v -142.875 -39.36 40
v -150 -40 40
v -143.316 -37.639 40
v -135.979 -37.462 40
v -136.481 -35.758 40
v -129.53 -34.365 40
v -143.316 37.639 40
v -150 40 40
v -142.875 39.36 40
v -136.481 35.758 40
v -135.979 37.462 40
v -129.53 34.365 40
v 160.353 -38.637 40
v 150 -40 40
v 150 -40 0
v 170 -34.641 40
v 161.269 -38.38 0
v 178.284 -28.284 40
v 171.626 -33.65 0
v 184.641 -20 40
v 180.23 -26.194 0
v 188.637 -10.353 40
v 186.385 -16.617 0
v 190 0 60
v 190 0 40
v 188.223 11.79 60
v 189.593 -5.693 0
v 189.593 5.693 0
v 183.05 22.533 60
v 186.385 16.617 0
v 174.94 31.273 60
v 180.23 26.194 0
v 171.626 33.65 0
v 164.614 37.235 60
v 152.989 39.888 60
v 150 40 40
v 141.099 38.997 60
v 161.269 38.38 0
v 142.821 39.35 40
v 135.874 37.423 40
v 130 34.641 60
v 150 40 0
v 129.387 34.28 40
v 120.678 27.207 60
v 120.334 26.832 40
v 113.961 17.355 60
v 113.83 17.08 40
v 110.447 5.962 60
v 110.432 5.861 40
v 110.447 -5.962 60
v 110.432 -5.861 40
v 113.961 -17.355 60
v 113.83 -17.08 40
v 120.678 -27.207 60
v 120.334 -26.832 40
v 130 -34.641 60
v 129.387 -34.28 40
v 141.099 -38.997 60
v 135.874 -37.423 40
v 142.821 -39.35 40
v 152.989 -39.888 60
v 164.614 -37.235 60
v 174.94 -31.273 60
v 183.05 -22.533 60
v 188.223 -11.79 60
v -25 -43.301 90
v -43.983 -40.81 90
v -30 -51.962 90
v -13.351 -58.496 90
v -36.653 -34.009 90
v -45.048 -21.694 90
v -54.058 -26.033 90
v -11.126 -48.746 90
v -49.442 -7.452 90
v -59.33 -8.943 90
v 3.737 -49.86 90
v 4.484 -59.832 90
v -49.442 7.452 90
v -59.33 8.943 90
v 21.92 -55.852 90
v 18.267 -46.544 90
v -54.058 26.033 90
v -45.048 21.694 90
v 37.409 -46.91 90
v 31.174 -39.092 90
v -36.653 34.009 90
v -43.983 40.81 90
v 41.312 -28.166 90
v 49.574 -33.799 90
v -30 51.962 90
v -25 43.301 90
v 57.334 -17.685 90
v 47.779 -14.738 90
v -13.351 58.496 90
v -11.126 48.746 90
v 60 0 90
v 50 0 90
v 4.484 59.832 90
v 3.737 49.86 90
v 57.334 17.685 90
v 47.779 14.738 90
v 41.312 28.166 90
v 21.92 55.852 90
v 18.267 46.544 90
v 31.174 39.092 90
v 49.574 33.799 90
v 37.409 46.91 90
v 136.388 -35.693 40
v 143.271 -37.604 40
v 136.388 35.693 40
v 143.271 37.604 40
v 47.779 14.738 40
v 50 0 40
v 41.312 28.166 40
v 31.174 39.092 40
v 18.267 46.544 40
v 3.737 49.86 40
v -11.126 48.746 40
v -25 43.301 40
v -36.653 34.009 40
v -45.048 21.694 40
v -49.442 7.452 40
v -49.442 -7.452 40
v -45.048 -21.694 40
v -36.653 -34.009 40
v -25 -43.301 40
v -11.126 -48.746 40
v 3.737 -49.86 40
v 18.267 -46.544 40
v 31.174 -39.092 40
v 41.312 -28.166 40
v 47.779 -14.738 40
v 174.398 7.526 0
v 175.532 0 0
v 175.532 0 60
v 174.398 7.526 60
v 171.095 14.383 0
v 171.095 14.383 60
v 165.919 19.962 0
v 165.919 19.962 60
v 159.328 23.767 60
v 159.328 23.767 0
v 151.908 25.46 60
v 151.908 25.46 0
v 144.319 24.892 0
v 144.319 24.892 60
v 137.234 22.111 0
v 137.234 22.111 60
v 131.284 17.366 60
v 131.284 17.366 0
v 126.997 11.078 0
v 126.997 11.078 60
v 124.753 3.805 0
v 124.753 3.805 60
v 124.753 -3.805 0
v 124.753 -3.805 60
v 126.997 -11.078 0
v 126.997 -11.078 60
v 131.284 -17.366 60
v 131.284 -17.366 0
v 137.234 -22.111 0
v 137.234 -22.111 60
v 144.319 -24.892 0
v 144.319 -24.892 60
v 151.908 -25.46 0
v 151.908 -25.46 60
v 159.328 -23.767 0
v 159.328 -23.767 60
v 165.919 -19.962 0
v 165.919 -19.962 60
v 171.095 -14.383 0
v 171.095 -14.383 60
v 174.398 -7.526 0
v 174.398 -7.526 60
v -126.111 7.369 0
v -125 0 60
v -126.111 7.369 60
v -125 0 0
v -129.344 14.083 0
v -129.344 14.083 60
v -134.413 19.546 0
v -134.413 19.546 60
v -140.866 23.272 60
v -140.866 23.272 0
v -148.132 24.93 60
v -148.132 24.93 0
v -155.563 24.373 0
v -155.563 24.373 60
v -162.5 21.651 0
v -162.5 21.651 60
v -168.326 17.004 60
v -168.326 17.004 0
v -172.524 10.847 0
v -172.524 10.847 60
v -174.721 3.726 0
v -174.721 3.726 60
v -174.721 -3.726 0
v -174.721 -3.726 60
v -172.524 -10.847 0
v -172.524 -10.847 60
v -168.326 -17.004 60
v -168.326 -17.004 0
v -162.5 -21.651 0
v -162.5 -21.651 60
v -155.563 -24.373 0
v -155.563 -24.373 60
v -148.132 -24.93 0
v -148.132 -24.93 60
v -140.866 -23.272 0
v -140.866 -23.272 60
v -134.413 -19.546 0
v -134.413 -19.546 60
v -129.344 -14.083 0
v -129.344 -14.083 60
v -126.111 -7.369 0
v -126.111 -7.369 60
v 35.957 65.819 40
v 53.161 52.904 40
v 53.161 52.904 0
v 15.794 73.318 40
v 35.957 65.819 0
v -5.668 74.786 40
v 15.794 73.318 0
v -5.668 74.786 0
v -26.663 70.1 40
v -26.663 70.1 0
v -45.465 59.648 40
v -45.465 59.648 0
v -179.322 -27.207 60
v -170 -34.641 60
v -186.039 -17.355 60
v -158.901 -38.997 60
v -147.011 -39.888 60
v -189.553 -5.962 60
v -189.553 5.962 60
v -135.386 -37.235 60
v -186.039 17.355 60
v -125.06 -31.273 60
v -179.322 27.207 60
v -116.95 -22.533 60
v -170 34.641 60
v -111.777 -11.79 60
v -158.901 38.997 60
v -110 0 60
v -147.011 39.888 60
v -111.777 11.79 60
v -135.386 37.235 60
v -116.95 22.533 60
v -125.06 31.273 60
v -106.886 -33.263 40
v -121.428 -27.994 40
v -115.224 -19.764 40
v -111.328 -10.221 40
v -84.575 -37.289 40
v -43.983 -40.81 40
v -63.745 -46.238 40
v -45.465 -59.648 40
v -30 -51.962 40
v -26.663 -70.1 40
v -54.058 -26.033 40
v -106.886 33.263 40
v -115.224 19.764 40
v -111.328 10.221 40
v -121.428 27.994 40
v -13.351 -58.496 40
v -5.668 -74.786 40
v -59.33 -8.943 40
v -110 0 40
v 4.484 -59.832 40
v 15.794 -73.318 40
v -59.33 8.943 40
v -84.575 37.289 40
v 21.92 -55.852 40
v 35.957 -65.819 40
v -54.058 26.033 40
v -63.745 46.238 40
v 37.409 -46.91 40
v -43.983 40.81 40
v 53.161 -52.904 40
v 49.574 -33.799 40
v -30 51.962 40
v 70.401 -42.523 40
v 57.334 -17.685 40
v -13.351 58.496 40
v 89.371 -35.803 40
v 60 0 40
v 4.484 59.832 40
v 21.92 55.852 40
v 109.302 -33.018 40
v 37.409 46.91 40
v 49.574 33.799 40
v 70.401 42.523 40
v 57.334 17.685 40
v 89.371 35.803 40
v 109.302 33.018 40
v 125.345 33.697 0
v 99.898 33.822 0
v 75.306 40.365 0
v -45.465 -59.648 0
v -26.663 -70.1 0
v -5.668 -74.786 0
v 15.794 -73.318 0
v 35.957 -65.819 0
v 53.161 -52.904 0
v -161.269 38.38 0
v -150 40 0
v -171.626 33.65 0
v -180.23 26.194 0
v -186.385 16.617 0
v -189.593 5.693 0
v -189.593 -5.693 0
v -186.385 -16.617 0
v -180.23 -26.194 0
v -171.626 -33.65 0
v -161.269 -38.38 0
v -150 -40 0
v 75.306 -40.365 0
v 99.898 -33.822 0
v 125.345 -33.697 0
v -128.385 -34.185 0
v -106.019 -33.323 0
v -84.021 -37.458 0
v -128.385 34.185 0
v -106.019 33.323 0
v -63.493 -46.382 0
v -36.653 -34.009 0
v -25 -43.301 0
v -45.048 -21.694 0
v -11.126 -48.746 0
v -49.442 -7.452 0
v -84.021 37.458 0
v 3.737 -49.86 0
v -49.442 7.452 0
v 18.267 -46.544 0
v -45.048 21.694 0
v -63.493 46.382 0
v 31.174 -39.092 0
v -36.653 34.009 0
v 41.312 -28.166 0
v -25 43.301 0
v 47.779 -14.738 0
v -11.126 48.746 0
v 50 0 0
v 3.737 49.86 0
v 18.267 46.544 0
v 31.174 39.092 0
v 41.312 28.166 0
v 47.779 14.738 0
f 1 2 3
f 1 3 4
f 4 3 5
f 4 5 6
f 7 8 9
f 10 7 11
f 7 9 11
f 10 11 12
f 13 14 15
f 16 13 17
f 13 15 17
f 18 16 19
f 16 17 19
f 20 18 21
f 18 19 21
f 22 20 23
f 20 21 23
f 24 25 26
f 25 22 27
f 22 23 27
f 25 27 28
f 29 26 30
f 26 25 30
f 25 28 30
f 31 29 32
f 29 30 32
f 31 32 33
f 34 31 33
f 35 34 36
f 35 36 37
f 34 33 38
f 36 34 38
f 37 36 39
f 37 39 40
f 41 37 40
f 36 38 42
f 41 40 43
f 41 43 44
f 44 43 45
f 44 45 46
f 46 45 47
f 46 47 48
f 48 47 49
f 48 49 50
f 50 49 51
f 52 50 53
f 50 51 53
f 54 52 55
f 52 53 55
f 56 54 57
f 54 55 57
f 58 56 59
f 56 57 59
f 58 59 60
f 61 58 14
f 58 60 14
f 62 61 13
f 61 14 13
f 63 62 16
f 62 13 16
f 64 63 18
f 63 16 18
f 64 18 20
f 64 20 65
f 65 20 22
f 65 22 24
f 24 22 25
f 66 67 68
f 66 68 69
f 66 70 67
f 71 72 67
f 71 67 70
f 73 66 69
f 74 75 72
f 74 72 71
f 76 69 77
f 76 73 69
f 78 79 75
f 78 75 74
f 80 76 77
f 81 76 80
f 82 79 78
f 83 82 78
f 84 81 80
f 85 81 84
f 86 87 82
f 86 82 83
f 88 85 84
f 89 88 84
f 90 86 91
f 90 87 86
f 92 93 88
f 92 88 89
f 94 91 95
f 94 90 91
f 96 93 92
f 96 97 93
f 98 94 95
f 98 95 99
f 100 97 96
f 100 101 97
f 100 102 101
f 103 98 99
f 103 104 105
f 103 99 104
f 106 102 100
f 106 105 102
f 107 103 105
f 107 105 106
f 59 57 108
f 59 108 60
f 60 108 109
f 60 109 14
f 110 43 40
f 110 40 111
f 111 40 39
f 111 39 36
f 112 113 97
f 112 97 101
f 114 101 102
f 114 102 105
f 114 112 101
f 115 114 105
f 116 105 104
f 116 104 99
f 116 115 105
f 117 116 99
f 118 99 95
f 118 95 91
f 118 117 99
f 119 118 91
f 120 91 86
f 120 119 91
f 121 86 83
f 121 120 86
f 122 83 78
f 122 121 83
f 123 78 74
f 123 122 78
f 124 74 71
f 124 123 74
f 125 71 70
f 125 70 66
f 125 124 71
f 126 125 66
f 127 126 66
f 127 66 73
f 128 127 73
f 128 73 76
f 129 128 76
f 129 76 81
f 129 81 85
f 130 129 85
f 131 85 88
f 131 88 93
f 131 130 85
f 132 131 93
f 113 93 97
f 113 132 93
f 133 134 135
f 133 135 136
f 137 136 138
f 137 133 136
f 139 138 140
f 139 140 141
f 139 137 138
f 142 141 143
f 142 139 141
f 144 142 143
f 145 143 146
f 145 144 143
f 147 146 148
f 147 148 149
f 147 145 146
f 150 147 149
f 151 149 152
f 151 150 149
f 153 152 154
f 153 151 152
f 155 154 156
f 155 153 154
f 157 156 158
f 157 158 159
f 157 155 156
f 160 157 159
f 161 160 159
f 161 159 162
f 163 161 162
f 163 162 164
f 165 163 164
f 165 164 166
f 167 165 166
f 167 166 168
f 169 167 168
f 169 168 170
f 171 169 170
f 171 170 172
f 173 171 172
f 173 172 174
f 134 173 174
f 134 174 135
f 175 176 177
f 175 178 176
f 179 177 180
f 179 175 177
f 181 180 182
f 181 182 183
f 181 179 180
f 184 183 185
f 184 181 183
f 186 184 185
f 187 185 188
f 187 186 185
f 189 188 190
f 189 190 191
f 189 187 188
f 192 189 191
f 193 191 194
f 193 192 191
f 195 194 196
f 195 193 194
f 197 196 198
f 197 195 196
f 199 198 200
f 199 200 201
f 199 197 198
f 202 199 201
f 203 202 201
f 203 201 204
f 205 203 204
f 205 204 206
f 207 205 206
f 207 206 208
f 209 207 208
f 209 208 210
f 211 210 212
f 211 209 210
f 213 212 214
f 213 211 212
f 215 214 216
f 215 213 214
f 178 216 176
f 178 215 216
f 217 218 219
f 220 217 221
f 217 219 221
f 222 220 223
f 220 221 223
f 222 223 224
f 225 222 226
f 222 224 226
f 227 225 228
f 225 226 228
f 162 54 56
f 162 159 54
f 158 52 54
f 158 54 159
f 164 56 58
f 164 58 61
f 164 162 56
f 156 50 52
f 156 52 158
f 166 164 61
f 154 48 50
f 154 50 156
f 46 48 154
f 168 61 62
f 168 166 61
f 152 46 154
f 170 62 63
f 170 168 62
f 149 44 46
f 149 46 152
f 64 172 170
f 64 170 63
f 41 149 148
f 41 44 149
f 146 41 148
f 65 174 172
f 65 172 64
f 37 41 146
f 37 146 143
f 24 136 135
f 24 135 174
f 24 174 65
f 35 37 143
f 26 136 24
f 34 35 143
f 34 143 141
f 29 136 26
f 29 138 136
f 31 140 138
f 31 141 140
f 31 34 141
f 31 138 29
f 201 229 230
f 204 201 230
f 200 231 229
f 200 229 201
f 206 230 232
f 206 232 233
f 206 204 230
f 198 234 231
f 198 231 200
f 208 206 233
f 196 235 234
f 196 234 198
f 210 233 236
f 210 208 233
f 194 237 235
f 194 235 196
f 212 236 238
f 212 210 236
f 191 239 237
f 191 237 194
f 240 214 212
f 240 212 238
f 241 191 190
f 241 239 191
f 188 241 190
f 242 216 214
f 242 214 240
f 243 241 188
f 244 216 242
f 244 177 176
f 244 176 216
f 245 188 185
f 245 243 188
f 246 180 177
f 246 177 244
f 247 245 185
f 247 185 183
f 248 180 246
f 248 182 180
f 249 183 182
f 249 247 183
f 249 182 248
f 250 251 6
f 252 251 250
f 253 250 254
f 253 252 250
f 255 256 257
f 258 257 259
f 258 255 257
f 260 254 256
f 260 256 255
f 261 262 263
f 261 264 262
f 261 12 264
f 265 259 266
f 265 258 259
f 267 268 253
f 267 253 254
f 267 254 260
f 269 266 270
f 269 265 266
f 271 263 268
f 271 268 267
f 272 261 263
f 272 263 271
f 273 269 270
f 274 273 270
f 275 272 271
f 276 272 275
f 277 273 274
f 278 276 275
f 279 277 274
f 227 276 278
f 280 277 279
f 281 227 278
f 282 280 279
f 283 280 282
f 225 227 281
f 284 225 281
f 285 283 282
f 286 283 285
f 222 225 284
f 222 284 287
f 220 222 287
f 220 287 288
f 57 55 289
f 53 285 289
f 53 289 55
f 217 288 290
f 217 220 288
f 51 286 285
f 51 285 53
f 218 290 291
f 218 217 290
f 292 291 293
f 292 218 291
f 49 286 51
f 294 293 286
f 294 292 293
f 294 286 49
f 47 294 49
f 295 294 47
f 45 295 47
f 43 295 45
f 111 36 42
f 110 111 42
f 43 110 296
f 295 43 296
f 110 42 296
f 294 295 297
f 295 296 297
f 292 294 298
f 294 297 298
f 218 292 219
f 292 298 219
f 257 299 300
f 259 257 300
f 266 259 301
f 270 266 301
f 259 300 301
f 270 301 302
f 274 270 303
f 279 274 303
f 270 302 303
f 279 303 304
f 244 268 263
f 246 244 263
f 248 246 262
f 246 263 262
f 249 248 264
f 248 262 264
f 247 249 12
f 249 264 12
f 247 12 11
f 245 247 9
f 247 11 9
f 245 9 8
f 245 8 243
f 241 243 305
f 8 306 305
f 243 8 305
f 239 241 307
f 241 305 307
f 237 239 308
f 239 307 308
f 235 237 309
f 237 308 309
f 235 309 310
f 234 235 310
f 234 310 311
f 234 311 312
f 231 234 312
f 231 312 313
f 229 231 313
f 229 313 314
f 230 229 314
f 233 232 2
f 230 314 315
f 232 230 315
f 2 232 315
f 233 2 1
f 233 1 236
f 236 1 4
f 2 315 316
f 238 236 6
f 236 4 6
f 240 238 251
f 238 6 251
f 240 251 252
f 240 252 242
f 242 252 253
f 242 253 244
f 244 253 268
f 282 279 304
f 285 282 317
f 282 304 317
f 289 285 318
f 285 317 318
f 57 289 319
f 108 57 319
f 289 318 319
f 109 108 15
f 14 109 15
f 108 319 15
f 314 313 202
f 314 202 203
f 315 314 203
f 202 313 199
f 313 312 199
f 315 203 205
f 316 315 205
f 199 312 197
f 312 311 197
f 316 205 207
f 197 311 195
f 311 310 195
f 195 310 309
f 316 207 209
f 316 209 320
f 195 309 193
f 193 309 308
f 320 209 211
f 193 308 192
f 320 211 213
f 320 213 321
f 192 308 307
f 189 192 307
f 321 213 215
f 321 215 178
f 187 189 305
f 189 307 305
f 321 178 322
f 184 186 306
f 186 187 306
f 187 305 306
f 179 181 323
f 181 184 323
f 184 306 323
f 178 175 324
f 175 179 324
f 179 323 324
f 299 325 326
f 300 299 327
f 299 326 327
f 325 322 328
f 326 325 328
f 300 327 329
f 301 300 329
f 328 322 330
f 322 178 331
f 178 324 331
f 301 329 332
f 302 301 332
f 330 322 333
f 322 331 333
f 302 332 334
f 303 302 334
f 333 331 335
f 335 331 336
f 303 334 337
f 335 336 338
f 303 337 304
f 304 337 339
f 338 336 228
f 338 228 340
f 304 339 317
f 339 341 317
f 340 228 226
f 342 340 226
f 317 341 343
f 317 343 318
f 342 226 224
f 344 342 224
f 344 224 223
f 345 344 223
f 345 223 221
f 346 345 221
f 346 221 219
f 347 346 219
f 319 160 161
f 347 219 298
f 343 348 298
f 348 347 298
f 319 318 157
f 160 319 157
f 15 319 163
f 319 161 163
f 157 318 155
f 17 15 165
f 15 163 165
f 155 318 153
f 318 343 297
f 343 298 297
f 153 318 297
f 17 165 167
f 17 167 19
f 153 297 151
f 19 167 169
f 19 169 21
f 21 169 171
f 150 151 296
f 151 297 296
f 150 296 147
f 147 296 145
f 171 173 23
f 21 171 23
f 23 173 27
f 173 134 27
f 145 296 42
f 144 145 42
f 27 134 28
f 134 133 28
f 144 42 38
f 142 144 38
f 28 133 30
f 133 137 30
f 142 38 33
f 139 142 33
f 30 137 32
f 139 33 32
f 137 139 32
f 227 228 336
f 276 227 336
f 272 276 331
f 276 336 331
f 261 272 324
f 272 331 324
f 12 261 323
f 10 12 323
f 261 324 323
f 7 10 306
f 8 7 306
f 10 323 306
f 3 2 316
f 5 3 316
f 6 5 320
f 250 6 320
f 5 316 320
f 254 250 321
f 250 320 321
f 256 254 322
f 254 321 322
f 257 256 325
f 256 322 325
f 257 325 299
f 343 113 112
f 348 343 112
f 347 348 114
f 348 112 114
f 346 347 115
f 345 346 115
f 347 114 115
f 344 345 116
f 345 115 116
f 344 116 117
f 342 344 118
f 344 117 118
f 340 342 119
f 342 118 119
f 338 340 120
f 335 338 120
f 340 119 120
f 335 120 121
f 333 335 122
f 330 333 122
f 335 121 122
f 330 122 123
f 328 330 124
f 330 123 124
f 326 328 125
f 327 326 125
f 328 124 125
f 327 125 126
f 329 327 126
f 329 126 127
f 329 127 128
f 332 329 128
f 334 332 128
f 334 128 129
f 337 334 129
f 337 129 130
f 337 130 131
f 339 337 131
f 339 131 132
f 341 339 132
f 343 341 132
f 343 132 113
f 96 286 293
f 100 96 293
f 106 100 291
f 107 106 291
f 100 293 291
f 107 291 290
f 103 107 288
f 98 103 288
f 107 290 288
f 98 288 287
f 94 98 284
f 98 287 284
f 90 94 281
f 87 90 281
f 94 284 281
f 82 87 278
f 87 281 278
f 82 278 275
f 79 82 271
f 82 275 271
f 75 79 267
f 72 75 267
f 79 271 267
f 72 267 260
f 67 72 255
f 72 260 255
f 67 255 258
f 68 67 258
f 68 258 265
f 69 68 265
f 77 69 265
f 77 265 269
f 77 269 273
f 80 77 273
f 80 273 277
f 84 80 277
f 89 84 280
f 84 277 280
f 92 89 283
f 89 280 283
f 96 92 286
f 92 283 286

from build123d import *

# Parameters (mm, degrees)
SKETCH1_R           = 25
SKETCH1_R_2         = 25.531825786
BOSS_EXTRUDE1_DEPTH = 40
SKETCH2_R           = 40
SKETCH2_R_2         = 25
SKETCH2_R_3         = 25.531825786
BOSS_EXTRUDE2_DEPTH = 20
SKETCH3_R           = 60
SKETCH3_R_2         = 50
BOSS_EXTRUDE3_DEPTH = 50
SKETCH4_R           = 50
CUT_EXTRUDE1_DEPTH  = 50


with BuildPart() as part:
    # Sketch1 → Boss-Extrude1 (new body)
    with BuildSketch(Plane.XY):
        with BuildLine():
            ThreePointArc((-150, -40), (-94.903714286, -34.773015604), (-45.465365878, -59.648139163))
            ThreePointArc((-45.465365878, -59.648139163), (5.116377771, -74.825281012), (53.161436396, -52.904269017))
            ThreePointArc((53.161436396, -52.904269017), (99.897642557, -33.821692035), (150, -40))
            ThreePointArc((150, -40), (190, 0), (150, 40))
            ThreePointArc((150, 40), (99.897642557, 33.821692035), (53.161436396, 52.904269017))
            ThreePointArc((53.161436396, 52.904269017), (5.116377771, 74.825281012), (-45.465365878, 59.648139163))
            ThreePointArc((-45.465365878, 59.648139163), (-94.903714286, 34.773015604), (-150, 40))
            ThreePointArc((-150, 40), (-190, 0), (-150, -40))
        make_face()
        with Locations((-150, 0)):
            Circle(SKETCH1_R, mode=Mode.SUBTRACT)
        with Locations((150, 0)):
            Circle(SKETCH1_R_2, mode=Mode.SUBTRACT)
    extrude(amount=BOSS_EXTRUDE1_DEPTH)

    # Sketch2 → Boss-Extrude2 (add)
    with BuildSketch(Plane.XY.offset(40)):
        with Locations((-150, 0)):
            Circle(SKETCH2_R)
        with Locations((-150, 0)):
            Circle(SKETCH2_R_2, mode=Mode.SUBTRACT)
        with Locations((150, 0)):
            Circle(SKETCH2_R)
        with Locations((150, 0)):
            Circle(SKETCH2_R_3, mode=Mode.SUBTRACT)
    extrude(amount=BOSS_EXTRUDE2_DEPTH)

    # Sketch3 → Boss-Extrude3 (add)
    with BuildSketch(Plane.XY.offset(40)):
        Circle(SKETCH3_R)
        Circle(SKETCH3_R_2, mode=Mode.SUBTRACT)
    extrude(amount=BOSS_EXTRUDE3_DEPTH)

    # Sketch4 → Cut-Extrude1 (cut)
    with BuildSketch(Plane.XY.offset(40)):
        Circle(SKETCH4_R)
    extrude(amount=-CUT_EXTRUDE1_DEPTH, mode=Mode.SUBTRACT)


solid = part.part
